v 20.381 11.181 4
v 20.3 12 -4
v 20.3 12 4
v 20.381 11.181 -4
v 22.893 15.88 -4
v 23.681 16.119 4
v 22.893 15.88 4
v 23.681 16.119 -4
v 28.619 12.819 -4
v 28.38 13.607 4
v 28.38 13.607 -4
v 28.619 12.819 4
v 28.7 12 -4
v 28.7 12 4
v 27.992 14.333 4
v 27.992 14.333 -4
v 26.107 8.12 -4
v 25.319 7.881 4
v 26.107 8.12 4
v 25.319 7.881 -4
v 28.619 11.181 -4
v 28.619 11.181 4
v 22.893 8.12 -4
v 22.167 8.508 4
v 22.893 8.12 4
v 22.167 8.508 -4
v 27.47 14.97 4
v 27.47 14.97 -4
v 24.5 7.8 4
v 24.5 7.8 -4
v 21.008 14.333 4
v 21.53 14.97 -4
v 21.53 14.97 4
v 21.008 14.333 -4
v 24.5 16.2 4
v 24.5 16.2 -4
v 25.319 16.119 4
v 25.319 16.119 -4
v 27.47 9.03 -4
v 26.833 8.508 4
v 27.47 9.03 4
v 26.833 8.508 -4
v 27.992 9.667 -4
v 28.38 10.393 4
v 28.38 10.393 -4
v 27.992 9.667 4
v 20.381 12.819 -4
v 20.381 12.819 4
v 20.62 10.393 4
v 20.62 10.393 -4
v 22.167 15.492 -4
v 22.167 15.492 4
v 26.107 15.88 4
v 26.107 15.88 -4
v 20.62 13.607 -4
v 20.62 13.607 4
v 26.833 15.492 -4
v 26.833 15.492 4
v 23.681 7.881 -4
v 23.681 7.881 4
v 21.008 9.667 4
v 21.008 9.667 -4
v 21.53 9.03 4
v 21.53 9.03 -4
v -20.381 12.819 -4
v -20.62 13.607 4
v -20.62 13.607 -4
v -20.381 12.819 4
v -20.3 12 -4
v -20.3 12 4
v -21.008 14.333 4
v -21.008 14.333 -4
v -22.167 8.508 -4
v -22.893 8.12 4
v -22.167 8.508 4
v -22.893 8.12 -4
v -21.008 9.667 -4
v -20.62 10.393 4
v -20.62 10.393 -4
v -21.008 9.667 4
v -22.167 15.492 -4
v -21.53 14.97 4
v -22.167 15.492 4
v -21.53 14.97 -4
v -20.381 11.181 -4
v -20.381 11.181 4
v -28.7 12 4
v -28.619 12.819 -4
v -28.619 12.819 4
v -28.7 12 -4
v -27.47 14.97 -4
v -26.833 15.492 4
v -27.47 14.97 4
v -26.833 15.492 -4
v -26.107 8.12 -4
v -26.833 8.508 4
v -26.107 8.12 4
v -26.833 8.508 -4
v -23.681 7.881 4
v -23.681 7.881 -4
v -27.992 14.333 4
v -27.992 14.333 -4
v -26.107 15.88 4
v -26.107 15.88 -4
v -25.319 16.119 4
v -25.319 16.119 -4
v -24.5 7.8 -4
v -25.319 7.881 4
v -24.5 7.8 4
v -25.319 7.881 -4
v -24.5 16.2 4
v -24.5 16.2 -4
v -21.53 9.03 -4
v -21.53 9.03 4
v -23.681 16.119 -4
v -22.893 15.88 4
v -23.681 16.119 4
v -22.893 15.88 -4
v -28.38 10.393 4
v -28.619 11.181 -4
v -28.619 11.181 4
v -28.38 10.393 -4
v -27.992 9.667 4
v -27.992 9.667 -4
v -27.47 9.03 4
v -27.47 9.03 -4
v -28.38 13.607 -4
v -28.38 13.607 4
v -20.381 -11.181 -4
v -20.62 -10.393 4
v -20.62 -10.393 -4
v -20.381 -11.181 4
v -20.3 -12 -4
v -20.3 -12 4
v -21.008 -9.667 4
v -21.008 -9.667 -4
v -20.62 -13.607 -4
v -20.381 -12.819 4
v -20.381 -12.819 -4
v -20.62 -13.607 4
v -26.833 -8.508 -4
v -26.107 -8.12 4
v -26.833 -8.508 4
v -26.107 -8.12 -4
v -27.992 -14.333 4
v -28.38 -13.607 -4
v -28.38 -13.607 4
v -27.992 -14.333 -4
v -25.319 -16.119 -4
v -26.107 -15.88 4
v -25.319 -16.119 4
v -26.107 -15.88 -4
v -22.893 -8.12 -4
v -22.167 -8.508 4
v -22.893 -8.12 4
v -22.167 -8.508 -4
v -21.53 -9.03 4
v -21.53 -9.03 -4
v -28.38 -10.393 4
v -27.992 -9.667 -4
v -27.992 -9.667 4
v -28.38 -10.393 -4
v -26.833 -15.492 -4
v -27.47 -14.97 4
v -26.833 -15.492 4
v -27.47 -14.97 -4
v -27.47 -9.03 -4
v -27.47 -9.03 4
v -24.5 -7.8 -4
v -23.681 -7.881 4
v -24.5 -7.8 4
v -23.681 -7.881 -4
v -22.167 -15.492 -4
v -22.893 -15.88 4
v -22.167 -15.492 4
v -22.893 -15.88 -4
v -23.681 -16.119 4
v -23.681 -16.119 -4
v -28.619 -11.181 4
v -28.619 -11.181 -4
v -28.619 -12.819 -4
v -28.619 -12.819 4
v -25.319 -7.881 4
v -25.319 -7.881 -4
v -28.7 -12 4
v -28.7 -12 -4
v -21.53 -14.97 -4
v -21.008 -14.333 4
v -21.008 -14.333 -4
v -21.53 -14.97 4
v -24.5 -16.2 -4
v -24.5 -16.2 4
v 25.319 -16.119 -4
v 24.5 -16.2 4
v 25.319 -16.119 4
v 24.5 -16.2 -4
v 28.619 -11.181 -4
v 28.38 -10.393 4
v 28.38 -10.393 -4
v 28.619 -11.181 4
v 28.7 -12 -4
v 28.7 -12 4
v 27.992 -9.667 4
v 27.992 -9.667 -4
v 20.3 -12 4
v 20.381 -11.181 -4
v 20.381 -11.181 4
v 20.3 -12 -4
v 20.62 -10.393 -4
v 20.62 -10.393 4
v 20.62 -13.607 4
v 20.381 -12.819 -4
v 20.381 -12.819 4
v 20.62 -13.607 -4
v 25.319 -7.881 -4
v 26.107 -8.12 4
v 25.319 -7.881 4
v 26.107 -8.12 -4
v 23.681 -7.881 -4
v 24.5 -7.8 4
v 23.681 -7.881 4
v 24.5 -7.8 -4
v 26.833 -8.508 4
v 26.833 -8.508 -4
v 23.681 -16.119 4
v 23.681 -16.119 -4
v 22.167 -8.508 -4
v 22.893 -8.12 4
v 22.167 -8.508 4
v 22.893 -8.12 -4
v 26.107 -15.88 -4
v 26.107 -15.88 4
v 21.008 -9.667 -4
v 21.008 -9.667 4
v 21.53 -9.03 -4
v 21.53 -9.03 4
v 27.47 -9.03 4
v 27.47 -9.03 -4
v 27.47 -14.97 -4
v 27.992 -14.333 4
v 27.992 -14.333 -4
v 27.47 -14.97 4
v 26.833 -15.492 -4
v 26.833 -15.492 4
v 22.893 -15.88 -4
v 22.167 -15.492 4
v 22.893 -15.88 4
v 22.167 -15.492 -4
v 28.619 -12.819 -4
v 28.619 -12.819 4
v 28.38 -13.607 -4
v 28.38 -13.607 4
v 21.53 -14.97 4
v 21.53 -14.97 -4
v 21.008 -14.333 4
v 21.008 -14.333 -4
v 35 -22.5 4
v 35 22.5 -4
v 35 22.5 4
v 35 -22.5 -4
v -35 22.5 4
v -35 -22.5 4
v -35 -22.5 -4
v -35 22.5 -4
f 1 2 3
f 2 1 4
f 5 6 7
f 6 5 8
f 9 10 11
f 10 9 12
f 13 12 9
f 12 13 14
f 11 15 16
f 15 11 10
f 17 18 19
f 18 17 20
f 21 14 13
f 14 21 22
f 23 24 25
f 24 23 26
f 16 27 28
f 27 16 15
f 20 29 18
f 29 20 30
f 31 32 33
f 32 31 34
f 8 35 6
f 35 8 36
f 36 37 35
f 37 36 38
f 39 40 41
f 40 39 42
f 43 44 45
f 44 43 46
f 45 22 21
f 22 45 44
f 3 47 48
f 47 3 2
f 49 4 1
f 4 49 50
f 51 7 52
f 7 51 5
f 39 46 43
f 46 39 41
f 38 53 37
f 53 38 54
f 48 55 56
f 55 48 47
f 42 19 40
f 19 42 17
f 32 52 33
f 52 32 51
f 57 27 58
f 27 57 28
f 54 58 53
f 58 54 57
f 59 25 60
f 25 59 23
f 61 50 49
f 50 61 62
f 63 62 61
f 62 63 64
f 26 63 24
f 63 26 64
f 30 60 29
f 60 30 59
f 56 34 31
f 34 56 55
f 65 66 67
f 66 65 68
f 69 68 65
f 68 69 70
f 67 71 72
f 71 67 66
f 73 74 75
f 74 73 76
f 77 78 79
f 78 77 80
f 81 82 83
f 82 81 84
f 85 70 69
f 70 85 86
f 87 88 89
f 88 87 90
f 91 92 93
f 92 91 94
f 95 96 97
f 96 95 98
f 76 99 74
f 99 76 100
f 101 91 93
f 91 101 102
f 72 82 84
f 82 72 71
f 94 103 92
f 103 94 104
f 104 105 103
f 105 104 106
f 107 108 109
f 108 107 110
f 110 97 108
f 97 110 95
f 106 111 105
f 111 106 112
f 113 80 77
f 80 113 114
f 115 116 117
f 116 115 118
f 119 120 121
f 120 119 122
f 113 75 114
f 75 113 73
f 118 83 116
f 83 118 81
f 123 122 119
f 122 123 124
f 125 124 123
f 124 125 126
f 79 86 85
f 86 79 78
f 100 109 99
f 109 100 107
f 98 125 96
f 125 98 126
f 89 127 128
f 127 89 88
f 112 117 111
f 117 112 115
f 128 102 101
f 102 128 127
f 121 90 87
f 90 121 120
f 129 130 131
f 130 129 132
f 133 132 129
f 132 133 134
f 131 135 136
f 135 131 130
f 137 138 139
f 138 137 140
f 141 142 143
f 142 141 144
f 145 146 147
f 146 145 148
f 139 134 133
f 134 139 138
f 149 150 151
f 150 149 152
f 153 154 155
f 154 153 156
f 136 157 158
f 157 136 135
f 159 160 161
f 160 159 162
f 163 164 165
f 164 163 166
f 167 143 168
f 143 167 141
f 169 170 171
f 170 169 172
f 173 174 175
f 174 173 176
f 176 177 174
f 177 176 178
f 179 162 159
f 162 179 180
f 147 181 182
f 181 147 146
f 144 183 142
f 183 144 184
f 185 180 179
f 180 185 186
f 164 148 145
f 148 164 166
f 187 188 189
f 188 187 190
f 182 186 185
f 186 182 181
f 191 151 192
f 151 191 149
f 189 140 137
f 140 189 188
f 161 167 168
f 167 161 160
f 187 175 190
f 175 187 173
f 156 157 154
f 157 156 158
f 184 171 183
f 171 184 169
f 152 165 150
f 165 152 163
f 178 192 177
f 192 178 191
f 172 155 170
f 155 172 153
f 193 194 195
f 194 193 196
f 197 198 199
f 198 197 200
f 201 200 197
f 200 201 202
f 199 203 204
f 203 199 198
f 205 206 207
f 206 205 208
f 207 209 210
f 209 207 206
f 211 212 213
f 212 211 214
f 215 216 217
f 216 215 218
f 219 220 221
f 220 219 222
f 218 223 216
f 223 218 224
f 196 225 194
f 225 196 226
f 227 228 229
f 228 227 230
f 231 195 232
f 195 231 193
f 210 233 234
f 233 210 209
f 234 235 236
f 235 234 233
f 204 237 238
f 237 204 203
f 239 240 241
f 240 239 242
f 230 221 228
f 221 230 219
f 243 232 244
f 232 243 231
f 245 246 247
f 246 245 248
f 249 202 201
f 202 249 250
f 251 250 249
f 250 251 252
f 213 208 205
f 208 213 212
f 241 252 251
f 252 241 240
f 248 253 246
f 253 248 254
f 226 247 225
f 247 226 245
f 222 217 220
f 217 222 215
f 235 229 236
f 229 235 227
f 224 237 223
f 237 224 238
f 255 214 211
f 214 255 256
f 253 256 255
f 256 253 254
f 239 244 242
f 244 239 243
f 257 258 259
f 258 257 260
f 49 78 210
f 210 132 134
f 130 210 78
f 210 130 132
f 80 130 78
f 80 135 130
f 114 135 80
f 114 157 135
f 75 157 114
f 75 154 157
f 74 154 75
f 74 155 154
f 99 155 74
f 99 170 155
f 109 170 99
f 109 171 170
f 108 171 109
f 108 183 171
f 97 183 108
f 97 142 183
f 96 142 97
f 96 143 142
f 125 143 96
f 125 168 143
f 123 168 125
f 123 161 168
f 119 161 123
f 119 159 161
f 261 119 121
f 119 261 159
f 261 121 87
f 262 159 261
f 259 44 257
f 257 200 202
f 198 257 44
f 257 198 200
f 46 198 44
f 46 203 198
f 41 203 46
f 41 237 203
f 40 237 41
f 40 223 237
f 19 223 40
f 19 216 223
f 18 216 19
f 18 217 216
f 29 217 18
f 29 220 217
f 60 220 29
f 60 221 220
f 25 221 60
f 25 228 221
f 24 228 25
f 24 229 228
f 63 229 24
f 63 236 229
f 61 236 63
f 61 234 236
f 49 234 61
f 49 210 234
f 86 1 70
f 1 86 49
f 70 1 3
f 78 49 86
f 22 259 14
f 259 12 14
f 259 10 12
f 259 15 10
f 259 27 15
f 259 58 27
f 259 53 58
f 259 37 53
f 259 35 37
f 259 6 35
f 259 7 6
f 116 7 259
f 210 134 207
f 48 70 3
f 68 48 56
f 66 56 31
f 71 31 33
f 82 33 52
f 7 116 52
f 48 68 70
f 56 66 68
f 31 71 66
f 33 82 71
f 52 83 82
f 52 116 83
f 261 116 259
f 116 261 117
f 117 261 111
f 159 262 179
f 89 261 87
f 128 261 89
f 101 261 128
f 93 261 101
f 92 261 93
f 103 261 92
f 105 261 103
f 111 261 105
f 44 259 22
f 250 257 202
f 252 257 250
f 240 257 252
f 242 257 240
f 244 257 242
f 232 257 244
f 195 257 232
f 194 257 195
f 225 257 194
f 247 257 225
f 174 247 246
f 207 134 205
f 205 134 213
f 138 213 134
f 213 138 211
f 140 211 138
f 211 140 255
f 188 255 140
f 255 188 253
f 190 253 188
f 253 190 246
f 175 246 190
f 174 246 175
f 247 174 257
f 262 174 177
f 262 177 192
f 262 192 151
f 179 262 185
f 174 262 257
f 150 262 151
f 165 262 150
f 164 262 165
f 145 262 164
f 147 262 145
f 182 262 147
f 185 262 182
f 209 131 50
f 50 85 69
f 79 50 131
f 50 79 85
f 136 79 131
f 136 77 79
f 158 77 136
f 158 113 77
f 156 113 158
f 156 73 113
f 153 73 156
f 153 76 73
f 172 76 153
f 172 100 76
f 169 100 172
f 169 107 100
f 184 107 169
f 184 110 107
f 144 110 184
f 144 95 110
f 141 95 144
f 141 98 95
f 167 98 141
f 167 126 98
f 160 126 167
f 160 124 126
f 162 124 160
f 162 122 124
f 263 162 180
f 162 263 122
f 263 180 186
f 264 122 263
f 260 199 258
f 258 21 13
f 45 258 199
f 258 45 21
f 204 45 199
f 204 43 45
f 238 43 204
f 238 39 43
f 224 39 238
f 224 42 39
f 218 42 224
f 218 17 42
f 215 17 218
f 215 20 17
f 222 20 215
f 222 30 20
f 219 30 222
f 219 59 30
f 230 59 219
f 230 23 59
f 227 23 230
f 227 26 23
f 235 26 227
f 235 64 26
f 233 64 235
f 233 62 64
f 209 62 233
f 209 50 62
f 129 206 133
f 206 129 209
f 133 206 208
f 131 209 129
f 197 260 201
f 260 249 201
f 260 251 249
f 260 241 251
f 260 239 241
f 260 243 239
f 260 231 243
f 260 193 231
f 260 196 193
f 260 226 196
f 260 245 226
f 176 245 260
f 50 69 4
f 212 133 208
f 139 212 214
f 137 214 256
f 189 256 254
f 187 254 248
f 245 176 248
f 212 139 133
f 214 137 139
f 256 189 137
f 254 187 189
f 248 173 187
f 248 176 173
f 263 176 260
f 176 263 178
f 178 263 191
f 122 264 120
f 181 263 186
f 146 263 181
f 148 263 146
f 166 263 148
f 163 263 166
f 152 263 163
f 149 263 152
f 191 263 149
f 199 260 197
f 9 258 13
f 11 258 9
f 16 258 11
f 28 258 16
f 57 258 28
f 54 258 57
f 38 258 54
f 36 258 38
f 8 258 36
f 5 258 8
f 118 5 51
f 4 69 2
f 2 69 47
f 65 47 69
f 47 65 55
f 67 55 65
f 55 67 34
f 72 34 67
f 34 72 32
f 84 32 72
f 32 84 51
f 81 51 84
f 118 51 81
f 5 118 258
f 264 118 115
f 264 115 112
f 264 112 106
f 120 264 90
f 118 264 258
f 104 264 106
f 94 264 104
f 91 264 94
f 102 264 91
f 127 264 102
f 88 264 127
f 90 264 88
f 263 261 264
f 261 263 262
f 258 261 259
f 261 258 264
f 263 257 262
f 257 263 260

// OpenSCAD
$fn = 32;

// ----------------------------------------------------------------------
// Corner plate 70 x 45 x 8
// 4 holes, centres taken from the edge offset
// ----------------------------------------------------------------------

// --- parameters (mm) ---
plate = [70, 45, 8];  // overall size (x, y, z)
holes = 4;            // number of holes the drawing asks for
hole_d = 8.4;         // hole diameter
edge = 10.5;          // hole centre offset from the plate edge

// --- derived feature positions (mm) ---
corner_x = plate[0] / 2 - edge;  // = 24.5   corner hole X
corner_y = plate[1] / 2 - edge;  // = 12   corner hole Y
feature_centers = [
  [corner_x, corner_y],
  [-corner_x, corner_y],
  [-corner_x, -corner_y],
  [corner_x, -corner_y]
];   // hole centres the loop below drills

// plate outline, every hole drilled through with the same cutters
difference() {
  cube(plate, center = true);
  for (centre = feature_centers)
    translate([centre[0], centre[1], 0])
      cylinder(d = hole_d, h = plate[2] + 2, center = true);
}
